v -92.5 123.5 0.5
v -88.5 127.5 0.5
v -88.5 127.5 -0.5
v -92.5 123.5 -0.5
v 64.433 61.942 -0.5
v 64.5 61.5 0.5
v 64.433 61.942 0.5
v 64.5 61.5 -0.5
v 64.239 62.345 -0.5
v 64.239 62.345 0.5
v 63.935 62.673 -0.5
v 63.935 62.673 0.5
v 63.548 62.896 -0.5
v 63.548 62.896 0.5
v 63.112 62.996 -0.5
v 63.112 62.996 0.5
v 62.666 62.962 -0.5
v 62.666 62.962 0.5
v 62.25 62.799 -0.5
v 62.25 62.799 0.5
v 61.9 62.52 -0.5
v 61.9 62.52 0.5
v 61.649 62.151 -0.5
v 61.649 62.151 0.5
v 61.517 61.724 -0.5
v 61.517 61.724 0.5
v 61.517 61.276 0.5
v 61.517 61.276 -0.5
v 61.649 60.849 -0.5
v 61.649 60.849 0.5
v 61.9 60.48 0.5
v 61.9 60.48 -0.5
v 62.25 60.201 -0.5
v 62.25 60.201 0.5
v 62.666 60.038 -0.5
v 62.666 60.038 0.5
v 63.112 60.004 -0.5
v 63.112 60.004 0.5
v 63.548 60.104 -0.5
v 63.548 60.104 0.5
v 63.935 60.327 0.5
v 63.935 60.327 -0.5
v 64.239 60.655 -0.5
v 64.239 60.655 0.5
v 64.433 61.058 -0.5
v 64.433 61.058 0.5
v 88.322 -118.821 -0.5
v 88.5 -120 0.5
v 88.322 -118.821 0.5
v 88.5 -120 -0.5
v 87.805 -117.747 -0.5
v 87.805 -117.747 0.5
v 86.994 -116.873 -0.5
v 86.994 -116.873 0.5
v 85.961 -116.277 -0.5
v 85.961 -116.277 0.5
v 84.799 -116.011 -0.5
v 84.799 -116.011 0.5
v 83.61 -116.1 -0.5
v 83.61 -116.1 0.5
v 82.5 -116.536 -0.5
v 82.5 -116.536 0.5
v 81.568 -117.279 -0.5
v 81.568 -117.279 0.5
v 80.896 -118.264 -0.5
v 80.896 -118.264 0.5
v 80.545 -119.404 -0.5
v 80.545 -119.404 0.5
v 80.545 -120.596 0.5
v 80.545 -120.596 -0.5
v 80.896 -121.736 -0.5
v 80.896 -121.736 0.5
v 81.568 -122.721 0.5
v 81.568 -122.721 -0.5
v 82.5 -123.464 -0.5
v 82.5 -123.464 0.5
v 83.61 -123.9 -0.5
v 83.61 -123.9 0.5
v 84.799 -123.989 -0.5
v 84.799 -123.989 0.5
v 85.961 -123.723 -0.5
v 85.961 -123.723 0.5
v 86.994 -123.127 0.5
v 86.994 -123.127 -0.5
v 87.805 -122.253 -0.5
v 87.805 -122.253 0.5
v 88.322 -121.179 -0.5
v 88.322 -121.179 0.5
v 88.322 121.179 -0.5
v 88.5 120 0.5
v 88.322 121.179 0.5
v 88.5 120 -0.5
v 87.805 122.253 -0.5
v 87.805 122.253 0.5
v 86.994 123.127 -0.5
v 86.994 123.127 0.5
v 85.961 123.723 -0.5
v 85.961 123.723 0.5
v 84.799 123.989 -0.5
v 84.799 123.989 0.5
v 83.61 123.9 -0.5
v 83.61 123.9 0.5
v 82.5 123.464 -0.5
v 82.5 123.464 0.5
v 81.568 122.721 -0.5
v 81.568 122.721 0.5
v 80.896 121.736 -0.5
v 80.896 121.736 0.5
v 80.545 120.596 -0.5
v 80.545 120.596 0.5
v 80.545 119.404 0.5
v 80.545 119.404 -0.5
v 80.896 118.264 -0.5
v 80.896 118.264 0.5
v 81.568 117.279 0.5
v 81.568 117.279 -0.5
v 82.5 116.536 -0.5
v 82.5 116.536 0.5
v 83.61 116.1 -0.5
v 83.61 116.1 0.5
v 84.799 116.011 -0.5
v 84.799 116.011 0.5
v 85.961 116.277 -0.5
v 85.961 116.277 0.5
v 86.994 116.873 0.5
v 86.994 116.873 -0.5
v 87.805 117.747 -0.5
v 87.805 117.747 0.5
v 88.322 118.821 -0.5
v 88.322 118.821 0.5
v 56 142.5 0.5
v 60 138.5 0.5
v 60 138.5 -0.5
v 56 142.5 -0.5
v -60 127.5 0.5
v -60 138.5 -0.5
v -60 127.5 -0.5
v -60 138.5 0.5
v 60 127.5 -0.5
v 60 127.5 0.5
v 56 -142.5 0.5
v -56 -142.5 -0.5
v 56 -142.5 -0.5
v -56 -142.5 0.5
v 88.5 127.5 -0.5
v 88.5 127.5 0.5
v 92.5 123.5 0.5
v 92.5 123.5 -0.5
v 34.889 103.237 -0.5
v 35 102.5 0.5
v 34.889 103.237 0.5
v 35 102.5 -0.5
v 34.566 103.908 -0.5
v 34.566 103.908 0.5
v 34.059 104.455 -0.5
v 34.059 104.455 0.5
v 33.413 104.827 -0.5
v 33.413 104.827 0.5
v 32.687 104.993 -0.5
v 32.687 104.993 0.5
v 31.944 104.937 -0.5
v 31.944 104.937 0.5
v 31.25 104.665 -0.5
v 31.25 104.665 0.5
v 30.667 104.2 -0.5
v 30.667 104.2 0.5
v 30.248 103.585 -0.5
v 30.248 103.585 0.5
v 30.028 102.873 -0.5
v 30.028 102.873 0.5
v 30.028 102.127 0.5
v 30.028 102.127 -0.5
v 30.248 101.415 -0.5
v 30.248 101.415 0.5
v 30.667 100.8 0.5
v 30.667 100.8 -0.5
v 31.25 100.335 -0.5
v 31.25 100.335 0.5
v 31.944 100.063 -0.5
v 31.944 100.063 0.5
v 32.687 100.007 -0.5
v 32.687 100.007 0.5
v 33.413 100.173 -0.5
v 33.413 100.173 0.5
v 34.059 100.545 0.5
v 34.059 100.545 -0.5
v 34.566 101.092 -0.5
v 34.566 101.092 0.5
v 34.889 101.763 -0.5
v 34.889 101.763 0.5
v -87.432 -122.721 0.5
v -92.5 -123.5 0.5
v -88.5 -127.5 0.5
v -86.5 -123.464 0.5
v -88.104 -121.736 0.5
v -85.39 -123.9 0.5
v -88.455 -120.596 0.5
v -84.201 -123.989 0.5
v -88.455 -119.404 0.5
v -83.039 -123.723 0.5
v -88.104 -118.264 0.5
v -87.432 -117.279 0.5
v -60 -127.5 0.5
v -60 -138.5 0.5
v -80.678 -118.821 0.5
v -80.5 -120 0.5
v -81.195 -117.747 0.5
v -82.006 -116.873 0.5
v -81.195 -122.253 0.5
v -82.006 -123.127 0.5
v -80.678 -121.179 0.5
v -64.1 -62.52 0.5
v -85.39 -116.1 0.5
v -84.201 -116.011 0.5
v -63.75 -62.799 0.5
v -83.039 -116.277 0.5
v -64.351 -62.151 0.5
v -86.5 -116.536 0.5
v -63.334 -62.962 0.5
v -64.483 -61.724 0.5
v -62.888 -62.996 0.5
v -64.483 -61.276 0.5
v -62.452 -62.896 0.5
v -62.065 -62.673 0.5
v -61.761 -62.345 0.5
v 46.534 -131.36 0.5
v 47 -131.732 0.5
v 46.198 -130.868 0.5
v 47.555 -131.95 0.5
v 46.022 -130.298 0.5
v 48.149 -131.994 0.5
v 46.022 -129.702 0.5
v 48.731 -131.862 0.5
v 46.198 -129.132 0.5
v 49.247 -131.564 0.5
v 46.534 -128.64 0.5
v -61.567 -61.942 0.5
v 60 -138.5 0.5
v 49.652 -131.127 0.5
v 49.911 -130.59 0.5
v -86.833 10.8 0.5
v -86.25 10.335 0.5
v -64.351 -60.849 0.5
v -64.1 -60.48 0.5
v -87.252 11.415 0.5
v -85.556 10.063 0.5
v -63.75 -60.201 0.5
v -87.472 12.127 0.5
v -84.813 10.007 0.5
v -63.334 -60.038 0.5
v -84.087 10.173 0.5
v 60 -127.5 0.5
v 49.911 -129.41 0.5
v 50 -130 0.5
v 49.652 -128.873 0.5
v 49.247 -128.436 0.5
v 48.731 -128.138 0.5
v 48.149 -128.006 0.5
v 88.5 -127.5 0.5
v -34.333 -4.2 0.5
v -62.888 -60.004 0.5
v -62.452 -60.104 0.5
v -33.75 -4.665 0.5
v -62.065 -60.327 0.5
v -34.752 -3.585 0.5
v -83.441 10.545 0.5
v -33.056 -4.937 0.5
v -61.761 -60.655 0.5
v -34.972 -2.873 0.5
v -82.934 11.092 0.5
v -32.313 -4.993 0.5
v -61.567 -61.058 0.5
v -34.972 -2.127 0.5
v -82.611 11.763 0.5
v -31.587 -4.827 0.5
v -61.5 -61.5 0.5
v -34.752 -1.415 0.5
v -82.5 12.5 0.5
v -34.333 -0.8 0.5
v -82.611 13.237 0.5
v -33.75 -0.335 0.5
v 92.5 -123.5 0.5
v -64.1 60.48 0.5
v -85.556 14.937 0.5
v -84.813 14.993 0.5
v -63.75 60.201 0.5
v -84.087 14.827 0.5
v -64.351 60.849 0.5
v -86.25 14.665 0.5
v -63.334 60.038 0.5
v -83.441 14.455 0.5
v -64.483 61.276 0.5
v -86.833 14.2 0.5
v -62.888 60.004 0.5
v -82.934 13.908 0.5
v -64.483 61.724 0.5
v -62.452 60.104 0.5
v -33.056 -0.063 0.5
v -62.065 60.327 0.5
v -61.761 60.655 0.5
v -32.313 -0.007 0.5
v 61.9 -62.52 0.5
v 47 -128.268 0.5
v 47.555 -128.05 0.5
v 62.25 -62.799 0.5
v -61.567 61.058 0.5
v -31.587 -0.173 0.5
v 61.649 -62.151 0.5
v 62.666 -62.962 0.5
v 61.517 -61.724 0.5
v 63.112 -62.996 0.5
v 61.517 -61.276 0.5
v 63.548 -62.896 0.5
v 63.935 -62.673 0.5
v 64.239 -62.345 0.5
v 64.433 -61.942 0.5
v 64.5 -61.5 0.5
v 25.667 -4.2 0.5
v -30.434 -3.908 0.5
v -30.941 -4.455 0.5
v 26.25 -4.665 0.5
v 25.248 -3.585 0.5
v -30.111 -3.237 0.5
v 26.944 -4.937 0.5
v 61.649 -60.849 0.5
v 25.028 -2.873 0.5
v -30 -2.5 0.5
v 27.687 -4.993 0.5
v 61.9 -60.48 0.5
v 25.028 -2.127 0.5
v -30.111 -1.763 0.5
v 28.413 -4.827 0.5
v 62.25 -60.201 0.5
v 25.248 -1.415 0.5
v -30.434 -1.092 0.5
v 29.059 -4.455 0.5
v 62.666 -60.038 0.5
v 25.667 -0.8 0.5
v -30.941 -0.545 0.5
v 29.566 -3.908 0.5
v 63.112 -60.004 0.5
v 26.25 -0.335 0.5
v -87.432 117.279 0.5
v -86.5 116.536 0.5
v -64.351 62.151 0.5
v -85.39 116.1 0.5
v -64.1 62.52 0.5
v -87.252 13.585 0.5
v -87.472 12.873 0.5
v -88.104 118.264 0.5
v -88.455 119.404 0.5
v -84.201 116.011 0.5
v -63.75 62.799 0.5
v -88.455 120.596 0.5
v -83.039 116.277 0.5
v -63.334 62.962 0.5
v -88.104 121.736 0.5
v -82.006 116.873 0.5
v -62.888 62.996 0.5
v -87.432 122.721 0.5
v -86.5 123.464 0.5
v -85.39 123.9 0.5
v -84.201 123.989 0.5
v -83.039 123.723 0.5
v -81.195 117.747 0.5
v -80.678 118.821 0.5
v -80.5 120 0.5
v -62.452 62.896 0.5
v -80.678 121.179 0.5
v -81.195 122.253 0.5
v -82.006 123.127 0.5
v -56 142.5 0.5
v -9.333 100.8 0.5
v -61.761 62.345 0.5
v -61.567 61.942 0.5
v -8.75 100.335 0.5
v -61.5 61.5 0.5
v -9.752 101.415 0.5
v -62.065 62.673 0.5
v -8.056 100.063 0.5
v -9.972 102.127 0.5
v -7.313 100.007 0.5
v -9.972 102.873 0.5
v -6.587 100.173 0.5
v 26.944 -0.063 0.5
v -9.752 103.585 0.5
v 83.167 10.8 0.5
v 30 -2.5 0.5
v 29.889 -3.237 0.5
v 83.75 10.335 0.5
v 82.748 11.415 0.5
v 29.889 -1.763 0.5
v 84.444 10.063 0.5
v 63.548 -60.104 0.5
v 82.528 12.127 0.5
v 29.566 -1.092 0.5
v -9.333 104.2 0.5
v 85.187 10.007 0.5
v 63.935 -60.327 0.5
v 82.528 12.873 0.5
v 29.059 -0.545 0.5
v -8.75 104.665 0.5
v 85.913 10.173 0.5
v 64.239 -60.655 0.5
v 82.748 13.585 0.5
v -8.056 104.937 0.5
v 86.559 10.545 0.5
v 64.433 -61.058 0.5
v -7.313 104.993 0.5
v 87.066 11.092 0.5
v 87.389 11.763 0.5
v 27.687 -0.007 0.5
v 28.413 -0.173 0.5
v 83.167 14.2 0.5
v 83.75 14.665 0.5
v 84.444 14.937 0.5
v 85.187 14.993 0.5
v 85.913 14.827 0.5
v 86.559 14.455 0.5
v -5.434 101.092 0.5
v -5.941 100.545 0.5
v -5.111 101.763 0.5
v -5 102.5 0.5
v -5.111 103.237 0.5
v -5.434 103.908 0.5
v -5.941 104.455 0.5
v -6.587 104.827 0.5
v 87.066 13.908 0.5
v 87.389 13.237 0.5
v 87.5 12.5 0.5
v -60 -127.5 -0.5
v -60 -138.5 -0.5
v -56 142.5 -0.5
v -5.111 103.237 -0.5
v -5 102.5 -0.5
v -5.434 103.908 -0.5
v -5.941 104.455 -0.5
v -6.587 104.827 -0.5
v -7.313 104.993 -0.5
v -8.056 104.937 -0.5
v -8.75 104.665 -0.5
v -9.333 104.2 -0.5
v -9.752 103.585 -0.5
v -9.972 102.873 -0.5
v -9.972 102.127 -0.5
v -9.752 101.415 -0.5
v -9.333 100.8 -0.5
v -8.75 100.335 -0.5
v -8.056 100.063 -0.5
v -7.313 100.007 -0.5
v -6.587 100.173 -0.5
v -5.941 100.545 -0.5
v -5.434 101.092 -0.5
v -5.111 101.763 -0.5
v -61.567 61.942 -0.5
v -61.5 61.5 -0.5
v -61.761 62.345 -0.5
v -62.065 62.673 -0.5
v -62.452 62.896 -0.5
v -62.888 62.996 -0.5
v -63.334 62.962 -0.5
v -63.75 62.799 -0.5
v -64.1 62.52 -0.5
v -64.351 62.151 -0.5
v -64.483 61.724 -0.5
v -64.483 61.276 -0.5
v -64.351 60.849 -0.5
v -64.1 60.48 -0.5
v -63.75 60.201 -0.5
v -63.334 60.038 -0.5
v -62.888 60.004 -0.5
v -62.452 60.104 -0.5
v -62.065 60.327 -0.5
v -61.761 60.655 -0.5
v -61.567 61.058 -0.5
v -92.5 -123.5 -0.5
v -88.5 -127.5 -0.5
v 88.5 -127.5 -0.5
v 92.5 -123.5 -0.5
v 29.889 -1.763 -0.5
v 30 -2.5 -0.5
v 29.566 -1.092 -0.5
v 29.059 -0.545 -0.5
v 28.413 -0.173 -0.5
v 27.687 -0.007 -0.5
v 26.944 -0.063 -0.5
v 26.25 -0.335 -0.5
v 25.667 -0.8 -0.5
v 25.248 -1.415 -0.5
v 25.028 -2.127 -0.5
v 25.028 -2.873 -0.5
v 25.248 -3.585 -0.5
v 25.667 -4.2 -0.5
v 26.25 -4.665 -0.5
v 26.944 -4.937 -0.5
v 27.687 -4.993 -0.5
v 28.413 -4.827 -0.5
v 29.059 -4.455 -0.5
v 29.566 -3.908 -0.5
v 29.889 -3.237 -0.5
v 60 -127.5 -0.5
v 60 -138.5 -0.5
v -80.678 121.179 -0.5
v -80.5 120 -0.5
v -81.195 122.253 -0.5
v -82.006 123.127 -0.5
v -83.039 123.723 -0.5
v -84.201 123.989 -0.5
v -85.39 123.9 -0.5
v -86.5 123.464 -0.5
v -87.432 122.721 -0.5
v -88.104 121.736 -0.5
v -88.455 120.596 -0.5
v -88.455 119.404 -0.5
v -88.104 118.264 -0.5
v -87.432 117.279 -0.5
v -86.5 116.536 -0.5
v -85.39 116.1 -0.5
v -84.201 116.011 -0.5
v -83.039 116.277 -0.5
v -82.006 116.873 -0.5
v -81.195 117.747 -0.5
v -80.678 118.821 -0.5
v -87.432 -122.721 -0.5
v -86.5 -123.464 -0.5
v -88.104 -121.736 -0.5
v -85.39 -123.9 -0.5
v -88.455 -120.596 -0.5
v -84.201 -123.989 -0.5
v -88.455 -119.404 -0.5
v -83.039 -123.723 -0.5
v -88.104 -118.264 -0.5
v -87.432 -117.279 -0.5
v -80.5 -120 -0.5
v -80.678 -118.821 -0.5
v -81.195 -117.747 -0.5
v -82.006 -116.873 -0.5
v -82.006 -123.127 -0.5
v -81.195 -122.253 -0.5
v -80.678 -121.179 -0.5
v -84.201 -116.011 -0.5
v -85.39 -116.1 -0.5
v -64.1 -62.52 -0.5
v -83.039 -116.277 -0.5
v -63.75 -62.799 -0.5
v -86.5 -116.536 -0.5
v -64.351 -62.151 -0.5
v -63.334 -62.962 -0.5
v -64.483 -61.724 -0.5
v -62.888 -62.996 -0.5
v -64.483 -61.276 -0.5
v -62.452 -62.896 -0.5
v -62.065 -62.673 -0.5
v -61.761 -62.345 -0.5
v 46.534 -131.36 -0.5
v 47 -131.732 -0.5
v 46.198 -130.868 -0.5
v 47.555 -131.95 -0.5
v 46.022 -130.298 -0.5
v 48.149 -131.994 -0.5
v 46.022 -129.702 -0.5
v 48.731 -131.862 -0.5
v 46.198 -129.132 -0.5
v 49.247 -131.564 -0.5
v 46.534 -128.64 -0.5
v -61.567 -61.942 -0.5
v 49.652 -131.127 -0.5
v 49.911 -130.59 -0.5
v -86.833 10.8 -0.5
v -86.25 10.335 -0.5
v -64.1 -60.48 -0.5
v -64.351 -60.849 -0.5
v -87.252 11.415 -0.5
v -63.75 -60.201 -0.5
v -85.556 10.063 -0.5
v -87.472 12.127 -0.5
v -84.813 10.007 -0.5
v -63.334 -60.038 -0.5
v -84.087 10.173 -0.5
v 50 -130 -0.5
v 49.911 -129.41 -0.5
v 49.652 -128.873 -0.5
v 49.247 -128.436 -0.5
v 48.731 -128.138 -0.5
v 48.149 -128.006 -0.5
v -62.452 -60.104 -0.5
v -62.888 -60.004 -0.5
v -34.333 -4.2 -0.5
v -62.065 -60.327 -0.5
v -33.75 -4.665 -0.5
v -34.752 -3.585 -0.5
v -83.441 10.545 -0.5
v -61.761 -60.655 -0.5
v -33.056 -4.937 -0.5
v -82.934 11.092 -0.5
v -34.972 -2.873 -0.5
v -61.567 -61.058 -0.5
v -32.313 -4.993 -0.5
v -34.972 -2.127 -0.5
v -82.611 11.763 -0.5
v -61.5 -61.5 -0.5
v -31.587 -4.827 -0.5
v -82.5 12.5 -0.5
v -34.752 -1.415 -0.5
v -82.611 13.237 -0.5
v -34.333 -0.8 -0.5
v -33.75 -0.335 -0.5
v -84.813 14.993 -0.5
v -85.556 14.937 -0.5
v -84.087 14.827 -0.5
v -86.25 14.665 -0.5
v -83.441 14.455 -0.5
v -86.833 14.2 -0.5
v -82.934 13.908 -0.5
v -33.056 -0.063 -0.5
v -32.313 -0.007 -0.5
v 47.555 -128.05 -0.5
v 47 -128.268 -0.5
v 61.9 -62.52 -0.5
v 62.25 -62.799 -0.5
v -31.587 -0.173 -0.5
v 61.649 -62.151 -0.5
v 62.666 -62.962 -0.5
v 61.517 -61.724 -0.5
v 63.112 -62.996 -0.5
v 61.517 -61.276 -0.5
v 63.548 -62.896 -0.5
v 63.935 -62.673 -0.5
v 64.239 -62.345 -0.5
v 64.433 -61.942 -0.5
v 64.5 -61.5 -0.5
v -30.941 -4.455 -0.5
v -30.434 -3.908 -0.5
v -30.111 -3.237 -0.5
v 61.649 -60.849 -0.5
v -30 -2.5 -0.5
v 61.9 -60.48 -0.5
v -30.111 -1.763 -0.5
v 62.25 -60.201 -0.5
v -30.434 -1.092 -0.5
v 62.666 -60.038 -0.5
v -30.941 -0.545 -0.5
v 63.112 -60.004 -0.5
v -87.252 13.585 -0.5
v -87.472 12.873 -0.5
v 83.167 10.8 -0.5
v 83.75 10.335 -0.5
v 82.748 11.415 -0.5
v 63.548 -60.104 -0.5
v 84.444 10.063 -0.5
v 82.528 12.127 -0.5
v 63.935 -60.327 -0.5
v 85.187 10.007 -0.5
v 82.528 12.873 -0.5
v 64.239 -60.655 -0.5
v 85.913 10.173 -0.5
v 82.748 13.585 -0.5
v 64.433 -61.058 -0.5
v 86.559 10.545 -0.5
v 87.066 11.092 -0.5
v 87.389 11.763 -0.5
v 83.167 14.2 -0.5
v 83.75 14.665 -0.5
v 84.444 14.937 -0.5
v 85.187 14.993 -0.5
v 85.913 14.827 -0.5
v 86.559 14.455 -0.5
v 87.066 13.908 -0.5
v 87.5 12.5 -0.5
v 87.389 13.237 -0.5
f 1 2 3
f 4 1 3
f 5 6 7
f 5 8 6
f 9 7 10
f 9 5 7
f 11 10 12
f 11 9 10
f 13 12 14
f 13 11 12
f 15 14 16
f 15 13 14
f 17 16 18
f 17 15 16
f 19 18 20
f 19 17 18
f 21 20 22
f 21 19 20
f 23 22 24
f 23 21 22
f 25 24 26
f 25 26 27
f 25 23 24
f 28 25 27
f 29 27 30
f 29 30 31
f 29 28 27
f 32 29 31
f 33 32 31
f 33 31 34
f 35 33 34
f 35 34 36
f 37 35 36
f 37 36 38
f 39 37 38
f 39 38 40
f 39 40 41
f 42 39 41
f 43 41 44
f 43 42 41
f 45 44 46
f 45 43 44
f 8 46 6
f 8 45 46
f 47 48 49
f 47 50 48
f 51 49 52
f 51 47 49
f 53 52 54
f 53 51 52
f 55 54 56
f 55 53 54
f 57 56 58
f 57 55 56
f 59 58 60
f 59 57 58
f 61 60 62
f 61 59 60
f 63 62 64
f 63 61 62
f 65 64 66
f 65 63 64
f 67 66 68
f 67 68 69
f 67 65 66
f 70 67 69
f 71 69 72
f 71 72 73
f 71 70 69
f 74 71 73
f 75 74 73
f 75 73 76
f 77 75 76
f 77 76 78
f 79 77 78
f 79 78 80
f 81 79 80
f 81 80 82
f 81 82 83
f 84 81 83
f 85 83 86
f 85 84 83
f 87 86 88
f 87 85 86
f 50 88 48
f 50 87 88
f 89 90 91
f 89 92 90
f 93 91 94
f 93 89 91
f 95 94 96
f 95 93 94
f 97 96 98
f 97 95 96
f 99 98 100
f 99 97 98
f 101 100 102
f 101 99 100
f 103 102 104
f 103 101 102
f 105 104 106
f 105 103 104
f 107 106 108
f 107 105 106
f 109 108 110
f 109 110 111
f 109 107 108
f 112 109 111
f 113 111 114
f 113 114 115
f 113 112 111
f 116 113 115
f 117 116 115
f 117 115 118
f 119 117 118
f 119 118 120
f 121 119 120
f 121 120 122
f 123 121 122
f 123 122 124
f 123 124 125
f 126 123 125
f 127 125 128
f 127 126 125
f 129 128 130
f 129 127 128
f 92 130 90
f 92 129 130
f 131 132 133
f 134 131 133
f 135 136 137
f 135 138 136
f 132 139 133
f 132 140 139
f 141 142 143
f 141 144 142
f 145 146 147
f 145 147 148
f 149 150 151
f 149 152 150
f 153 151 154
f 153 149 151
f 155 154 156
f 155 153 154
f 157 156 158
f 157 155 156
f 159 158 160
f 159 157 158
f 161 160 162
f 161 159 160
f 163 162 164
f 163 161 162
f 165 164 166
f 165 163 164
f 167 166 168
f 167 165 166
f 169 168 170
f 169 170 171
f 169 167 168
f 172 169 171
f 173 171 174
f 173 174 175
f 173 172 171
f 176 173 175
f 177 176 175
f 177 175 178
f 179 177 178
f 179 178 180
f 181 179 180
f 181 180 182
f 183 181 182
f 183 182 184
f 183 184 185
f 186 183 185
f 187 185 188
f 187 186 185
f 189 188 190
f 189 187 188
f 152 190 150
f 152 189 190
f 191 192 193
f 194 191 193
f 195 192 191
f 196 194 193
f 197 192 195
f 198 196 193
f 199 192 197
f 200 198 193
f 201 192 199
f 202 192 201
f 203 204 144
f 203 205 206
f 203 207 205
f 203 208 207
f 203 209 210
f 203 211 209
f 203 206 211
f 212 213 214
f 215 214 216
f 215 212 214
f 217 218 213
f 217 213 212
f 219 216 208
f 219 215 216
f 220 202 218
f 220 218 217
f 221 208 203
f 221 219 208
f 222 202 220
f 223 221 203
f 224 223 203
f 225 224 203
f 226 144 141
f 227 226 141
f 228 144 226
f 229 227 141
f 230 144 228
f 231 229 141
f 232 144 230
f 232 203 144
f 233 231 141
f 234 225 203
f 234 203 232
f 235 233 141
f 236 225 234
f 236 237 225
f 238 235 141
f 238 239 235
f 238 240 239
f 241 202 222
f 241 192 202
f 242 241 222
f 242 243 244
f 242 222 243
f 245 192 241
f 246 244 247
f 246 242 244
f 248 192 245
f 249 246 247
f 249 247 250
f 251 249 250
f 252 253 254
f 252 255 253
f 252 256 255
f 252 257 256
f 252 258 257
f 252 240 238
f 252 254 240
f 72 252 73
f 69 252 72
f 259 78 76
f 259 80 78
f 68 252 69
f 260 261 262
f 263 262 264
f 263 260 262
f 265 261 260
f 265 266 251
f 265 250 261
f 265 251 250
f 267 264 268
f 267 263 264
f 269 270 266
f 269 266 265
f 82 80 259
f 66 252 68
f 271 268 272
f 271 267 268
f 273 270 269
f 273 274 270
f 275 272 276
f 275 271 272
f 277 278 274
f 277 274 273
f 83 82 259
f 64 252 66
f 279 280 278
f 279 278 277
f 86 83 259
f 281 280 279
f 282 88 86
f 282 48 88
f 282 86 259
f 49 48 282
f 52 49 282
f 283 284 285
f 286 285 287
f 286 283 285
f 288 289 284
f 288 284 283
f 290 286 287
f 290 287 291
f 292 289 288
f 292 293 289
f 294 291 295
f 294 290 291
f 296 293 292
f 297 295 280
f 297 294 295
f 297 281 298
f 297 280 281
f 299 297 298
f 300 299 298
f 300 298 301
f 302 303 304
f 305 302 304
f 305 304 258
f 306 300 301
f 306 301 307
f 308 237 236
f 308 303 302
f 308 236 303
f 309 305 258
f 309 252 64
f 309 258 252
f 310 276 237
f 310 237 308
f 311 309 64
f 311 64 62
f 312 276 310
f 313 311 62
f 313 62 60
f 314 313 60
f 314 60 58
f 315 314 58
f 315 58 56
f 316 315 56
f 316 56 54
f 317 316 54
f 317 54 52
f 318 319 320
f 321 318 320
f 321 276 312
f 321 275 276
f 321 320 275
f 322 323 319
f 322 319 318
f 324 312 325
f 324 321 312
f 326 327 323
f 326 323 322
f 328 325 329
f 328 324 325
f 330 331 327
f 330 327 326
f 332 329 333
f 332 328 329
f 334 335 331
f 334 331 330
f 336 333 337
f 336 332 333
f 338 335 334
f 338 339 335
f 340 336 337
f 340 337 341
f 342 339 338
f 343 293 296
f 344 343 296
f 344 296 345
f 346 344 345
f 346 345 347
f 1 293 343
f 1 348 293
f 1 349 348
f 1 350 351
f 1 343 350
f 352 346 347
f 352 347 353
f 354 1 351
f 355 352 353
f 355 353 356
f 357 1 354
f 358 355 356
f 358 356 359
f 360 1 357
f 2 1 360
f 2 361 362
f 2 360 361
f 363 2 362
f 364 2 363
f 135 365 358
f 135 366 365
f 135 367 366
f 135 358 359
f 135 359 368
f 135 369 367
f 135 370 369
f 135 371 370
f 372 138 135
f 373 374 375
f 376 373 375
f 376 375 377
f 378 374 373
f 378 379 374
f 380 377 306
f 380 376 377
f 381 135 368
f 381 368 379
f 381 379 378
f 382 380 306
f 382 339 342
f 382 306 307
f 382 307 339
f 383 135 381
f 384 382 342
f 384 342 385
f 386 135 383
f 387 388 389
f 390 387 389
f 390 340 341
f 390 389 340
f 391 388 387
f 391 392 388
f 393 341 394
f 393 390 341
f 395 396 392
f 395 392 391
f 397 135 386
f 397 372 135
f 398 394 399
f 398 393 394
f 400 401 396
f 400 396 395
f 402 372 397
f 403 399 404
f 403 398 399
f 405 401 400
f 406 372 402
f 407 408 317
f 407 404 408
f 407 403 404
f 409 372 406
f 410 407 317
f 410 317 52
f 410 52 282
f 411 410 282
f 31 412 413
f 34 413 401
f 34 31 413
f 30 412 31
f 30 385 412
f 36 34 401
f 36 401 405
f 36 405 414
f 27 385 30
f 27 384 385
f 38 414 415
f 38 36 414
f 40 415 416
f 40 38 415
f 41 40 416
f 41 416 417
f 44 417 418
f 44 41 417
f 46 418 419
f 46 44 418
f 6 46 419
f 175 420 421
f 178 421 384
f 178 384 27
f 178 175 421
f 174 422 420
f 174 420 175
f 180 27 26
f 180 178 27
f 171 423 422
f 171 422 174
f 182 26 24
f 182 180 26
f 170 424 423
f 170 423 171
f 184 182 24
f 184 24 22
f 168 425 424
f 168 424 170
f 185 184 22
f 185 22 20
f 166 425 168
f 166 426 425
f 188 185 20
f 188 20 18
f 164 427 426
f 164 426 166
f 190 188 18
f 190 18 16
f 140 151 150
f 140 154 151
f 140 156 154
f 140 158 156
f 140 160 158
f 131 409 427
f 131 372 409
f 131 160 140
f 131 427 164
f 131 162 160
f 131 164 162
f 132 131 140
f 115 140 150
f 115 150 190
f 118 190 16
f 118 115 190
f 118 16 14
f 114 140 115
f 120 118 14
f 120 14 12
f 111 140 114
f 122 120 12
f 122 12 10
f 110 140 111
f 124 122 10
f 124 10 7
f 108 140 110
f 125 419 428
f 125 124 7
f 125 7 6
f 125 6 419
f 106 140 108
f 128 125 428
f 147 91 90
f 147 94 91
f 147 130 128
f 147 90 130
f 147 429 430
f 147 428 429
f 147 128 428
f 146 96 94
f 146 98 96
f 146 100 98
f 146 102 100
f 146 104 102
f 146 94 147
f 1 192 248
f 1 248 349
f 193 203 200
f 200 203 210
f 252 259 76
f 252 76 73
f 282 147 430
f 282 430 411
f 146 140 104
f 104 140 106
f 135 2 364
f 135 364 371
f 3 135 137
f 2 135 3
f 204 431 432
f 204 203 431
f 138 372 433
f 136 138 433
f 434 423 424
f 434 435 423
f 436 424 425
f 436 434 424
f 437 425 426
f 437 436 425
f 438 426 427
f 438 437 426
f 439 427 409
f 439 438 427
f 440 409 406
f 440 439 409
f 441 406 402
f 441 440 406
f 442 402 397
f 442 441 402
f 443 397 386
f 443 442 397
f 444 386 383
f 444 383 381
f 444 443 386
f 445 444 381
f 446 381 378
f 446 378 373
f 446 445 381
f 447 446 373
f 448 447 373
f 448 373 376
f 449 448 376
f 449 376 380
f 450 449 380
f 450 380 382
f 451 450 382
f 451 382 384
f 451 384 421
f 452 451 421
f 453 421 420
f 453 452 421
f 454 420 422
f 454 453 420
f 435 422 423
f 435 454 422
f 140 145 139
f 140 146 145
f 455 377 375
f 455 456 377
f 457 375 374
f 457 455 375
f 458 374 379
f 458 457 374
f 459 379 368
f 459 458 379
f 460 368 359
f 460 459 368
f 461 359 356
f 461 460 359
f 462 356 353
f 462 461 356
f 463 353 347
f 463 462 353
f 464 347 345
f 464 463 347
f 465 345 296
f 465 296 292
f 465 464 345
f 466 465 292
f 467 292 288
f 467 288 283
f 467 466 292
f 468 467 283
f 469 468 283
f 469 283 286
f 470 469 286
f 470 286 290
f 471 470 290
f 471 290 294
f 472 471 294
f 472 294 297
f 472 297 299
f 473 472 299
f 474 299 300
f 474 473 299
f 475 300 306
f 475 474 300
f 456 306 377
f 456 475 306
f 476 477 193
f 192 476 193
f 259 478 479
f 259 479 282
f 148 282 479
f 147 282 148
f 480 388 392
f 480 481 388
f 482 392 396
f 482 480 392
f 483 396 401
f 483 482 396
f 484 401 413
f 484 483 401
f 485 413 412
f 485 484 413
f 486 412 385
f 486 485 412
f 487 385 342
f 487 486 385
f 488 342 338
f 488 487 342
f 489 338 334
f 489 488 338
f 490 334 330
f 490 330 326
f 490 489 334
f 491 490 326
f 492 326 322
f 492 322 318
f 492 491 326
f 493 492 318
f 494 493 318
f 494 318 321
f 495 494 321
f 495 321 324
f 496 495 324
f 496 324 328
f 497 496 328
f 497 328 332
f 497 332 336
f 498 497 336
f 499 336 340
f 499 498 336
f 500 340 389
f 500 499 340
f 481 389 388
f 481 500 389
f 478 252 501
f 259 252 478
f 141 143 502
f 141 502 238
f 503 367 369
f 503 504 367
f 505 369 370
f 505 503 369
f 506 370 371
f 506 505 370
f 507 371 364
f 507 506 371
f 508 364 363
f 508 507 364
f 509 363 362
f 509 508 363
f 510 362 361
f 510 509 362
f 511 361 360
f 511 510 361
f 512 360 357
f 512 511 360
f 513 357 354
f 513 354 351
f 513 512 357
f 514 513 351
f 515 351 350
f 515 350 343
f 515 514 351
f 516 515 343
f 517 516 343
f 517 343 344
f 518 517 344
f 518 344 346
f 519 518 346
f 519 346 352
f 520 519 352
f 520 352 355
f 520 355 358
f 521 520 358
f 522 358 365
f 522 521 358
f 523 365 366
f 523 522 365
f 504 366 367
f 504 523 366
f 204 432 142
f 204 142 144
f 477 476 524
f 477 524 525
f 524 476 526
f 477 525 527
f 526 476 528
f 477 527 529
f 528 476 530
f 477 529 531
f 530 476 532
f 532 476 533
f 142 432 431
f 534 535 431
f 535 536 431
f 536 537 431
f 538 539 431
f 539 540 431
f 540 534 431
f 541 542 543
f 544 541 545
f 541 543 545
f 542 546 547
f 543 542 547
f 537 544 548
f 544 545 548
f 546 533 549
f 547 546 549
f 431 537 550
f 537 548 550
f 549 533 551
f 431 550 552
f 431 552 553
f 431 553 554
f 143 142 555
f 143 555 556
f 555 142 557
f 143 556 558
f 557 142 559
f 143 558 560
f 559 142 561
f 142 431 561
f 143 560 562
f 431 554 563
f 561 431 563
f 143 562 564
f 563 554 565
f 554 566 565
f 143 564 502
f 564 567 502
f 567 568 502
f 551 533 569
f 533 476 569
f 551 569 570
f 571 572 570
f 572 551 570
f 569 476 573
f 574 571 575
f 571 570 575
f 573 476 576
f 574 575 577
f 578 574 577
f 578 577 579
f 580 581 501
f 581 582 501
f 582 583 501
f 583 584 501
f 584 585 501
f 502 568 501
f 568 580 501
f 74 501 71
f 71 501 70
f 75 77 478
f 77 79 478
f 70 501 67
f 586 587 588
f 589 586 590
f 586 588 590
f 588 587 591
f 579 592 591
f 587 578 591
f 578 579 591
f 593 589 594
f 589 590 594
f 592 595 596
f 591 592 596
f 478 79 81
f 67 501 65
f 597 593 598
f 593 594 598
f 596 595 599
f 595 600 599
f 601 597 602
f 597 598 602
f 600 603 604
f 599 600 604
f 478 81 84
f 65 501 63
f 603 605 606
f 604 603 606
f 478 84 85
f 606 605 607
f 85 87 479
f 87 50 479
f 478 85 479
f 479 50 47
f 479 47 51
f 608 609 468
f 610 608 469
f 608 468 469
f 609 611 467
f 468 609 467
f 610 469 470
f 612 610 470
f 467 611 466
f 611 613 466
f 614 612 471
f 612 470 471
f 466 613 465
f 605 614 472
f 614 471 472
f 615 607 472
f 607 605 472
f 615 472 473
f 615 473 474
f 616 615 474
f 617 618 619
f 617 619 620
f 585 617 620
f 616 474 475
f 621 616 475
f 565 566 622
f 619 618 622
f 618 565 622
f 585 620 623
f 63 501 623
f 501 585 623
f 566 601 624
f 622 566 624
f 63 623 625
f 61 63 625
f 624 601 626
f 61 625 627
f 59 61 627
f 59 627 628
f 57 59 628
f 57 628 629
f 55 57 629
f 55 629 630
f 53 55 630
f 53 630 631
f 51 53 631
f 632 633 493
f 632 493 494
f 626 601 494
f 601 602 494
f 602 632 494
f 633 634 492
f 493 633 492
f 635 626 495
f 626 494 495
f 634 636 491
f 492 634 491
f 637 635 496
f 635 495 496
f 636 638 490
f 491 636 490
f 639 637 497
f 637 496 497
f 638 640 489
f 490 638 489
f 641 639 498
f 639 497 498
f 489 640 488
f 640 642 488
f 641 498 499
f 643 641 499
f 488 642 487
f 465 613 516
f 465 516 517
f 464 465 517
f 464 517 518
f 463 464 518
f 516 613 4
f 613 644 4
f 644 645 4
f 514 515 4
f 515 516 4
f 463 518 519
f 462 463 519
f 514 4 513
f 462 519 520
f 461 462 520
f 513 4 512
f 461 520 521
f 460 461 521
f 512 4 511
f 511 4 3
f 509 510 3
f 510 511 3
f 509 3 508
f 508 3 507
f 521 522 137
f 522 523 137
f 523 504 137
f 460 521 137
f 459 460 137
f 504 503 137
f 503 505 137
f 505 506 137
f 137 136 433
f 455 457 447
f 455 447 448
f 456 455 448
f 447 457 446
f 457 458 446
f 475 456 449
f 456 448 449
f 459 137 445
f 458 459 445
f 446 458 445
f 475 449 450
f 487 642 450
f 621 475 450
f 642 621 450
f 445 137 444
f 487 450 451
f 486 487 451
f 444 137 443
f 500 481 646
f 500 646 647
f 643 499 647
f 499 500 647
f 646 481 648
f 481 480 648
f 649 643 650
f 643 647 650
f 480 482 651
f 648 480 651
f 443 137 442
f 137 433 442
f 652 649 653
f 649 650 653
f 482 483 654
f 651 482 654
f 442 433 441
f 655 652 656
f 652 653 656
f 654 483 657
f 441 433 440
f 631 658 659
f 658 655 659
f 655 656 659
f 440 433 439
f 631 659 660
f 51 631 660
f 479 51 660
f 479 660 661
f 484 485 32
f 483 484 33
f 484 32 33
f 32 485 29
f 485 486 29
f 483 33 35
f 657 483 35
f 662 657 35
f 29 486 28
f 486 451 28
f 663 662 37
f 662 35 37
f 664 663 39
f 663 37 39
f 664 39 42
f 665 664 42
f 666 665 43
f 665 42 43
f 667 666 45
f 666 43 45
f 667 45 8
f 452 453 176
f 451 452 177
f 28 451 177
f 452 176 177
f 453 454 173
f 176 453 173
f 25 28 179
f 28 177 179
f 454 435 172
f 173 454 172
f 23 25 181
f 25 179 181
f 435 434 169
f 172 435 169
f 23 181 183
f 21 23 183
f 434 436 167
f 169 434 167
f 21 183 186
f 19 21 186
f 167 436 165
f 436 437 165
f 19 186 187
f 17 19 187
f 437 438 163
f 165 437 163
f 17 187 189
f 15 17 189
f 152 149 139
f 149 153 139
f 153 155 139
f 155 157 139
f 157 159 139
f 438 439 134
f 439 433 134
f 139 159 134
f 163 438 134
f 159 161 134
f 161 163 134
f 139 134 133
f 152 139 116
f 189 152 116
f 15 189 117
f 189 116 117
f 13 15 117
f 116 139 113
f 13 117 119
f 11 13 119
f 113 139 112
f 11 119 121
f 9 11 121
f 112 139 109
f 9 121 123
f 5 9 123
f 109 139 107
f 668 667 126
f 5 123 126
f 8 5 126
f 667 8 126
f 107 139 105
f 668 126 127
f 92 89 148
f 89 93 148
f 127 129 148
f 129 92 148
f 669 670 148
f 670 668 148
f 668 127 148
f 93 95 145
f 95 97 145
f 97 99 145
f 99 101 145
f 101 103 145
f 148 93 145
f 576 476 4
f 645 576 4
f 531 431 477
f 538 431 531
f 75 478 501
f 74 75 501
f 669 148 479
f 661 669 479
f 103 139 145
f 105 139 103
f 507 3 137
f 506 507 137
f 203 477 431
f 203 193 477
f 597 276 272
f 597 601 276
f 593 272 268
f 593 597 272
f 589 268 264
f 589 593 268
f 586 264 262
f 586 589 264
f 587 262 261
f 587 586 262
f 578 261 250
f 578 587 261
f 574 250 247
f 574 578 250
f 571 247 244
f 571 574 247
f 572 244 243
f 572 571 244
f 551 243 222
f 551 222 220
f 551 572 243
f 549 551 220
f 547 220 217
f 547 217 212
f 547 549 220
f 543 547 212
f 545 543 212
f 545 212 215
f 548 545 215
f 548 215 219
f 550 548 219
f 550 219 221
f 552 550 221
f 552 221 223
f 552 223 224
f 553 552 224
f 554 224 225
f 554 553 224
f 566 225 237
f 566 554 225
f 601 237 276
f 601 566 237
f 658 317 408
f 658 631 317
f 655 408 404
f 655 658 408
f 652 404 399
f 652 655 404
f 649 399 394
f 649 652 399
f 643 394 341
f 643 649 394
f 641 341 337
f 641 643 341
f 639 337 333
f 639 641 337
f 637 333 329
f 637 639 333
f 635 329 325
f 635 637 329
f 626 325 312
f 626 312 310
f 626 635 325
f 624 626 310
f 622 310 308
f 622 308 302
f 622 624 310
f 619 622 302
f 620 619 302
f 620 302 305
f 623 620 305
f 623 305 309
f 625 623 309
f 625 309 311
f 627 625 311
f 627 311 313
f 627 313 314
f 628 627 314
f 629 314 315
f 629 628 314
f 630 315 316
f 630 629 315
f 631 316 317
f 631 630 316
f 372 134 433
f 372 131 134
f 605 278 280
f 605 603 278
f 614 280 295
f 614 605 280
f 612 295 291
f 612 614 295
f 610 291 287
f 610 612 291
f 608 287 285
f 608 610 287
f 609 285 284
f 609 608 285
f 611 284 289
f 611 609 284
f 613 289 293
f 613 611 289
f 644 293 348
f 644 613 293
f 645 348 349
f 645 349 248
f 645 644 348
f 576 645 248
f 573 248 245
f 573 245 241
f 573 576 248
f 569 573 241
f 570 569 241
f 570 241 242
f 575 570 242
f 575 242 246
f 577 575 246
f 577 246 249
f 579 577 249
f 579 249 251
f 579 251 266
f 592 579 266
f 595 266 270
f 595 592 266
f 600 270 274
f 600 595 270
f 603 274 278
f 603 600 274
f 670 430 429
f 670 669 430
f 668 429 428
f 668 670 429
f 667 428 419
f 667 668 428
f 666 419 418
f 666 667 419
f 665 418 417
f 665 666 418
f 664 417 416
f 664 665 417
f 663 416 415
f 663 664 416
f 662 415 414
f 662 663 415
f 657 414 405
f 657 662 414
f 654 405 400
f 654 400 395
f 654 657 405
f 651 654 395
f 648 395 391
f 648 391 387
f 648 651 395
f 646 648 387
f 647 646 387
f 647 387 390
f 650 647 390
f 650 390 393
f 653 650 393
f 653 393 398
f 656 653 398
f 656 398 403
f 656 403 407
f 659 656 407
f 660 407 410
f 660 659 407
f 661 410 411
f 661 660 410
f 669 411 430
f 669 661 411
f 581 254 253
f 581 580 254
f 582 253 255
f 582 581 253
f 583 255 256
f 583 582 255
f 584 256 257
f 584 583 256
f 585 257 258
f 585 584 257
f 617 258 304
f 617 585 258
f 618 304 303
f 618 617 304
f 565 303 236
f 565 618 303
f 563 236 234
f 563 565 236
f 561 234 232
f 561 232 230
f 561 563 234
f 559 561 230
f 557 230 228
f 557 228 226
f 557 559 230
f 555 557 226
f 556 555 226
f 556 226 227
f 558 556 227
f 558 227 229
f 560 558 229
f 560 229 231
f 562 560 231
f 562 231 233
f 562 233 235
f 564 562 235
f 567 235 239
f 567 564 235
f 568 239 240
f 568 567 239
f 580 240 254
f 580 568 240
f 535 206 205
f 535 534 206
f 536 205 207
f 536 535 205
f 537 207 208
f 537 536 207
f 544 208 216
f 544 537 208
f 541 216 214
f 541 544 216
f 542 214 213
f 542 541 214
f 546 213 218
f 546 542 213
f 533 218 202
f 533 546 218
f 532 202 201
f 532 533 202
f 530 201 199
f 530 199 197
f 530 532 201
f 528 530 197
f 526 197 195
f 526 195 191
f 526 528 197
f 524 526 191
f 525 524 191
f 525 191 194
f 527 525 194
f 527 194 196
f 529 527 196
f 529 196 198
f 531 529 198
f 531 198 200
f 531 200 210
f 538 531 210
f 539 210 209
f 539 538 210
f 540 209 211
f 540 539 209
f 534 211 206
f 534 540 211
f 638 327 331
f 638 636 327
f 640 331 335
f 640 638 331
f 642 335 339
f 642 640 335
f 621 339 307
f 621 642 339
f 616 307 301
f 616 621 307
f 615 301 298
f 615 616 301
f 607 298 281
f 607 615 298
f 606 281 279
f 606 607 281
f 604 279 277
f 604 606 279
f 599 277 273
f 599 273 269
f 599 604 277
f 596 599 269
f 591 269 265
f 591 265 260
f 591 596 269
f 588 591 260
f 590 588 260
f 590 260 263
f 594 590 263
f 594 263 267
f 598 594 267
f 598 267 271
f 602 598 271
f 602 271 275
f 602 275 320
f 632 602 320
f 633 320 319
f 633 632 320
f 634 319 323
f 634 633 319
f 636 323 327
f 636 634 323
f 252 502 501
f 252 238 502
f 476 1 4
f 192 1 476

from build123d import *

# Parameters (mm, degrees)
F0_R     = 4
F0_R_2   = 1.5
F0_R_3   = 2.5
F0_R_4   = 2
F1_DEPTH = 0.5
F2_SIZE  = 4


with BuildPart() as f1:
    # F0 (on Top) → F1 (new body, symmetric)
    with BuildSketch(Plane.XY):
        Polygon((-92.5, 127.5), (-92.5, 0), (-92.5, -127.5), (-60, -127.5), (-60, -142.5), (0, -142.5), (60, -142.5), (60, -127.5), (92.5, -127.5), (92.5, 0), (92.5, 127.5), (60, 127.5), (60, 142.5), (0, 142.5), (-60, 142.5), (-60, 127.5), align=None)
        with Locations((-84.5, -120)):
            Circle(F0_R, mode=Mode.SUBTRACT)
        with Locations((-63, -61.5)):
            Circle(F0_R_2, mode=Mode.SUBTRACT)
        with Locations((-32.5, -2.5)):
            Circle(F0_R_3, mode=Mode.SUBTRACT)
        with Locations((48, -130)):
            Circle(F0_R_4, mode=Mode.SUBTRACT)
        with Locations((84.5, -120)):
            Circle(F0_R, mode=Mode.SUBTRACT)
        with Locations((27.5, -2.5)):
            Circle(F0_R_3, mode=Mode.SUBTRACT)
        with Locations((63, -61.5)):
            Circle(F0_R_2, mode=Mode.SUBTRACT)
        with Locations((-85, 12.5)):
            Circle(F0_R_3, mode=Mode.SUBTRACT)
        with Locations((-63, 61.5)):
            Circle(F0_R_2, mode=Mode.SUBTRACT)
        with Locations((-84.5, 120)):
            Circle(F0_R, mode=Mode.SUBTRACT)
        with Locations((-7.5, 102.5)):
            Circle(F0_R_3, mode=Mode.SUBTRACT)
        with Locations((85, 12.5)):
            Circle(F0_R_3, mode=Mode.SUBTRACT)
        with Locations((63, 61.5)):
            Circle(F0_R_2, mode=Mode.SUBTRACT)
        with Locations((32.5, 102.5)):
            Circle(F0_R_3, mode=Mode.SUBTRACT)
        with Locations((84.5, 120)):
            Circle(F0_R, mode=Mode.SUBTRACT)
    extrude(amount=F1_DEPTH, both=True)

    # F2
    f2_edges = [f1.edges().sort_by_distance(p)[0] for p in [
        (-92.5, 127.5, 0),
        (-60, 142.5, 0),
        (60, 142.5, 0),
        (92.5, 127.5, 0),
        (92.5, -127.5, 0),
        (60, -142.5, 0),
        (-60, -142.5, 0),
        (-92.5, -127.5, 0),
    ]]
    chamfer(f2_edges, length=F2_SIZE)


solid = f1.part
